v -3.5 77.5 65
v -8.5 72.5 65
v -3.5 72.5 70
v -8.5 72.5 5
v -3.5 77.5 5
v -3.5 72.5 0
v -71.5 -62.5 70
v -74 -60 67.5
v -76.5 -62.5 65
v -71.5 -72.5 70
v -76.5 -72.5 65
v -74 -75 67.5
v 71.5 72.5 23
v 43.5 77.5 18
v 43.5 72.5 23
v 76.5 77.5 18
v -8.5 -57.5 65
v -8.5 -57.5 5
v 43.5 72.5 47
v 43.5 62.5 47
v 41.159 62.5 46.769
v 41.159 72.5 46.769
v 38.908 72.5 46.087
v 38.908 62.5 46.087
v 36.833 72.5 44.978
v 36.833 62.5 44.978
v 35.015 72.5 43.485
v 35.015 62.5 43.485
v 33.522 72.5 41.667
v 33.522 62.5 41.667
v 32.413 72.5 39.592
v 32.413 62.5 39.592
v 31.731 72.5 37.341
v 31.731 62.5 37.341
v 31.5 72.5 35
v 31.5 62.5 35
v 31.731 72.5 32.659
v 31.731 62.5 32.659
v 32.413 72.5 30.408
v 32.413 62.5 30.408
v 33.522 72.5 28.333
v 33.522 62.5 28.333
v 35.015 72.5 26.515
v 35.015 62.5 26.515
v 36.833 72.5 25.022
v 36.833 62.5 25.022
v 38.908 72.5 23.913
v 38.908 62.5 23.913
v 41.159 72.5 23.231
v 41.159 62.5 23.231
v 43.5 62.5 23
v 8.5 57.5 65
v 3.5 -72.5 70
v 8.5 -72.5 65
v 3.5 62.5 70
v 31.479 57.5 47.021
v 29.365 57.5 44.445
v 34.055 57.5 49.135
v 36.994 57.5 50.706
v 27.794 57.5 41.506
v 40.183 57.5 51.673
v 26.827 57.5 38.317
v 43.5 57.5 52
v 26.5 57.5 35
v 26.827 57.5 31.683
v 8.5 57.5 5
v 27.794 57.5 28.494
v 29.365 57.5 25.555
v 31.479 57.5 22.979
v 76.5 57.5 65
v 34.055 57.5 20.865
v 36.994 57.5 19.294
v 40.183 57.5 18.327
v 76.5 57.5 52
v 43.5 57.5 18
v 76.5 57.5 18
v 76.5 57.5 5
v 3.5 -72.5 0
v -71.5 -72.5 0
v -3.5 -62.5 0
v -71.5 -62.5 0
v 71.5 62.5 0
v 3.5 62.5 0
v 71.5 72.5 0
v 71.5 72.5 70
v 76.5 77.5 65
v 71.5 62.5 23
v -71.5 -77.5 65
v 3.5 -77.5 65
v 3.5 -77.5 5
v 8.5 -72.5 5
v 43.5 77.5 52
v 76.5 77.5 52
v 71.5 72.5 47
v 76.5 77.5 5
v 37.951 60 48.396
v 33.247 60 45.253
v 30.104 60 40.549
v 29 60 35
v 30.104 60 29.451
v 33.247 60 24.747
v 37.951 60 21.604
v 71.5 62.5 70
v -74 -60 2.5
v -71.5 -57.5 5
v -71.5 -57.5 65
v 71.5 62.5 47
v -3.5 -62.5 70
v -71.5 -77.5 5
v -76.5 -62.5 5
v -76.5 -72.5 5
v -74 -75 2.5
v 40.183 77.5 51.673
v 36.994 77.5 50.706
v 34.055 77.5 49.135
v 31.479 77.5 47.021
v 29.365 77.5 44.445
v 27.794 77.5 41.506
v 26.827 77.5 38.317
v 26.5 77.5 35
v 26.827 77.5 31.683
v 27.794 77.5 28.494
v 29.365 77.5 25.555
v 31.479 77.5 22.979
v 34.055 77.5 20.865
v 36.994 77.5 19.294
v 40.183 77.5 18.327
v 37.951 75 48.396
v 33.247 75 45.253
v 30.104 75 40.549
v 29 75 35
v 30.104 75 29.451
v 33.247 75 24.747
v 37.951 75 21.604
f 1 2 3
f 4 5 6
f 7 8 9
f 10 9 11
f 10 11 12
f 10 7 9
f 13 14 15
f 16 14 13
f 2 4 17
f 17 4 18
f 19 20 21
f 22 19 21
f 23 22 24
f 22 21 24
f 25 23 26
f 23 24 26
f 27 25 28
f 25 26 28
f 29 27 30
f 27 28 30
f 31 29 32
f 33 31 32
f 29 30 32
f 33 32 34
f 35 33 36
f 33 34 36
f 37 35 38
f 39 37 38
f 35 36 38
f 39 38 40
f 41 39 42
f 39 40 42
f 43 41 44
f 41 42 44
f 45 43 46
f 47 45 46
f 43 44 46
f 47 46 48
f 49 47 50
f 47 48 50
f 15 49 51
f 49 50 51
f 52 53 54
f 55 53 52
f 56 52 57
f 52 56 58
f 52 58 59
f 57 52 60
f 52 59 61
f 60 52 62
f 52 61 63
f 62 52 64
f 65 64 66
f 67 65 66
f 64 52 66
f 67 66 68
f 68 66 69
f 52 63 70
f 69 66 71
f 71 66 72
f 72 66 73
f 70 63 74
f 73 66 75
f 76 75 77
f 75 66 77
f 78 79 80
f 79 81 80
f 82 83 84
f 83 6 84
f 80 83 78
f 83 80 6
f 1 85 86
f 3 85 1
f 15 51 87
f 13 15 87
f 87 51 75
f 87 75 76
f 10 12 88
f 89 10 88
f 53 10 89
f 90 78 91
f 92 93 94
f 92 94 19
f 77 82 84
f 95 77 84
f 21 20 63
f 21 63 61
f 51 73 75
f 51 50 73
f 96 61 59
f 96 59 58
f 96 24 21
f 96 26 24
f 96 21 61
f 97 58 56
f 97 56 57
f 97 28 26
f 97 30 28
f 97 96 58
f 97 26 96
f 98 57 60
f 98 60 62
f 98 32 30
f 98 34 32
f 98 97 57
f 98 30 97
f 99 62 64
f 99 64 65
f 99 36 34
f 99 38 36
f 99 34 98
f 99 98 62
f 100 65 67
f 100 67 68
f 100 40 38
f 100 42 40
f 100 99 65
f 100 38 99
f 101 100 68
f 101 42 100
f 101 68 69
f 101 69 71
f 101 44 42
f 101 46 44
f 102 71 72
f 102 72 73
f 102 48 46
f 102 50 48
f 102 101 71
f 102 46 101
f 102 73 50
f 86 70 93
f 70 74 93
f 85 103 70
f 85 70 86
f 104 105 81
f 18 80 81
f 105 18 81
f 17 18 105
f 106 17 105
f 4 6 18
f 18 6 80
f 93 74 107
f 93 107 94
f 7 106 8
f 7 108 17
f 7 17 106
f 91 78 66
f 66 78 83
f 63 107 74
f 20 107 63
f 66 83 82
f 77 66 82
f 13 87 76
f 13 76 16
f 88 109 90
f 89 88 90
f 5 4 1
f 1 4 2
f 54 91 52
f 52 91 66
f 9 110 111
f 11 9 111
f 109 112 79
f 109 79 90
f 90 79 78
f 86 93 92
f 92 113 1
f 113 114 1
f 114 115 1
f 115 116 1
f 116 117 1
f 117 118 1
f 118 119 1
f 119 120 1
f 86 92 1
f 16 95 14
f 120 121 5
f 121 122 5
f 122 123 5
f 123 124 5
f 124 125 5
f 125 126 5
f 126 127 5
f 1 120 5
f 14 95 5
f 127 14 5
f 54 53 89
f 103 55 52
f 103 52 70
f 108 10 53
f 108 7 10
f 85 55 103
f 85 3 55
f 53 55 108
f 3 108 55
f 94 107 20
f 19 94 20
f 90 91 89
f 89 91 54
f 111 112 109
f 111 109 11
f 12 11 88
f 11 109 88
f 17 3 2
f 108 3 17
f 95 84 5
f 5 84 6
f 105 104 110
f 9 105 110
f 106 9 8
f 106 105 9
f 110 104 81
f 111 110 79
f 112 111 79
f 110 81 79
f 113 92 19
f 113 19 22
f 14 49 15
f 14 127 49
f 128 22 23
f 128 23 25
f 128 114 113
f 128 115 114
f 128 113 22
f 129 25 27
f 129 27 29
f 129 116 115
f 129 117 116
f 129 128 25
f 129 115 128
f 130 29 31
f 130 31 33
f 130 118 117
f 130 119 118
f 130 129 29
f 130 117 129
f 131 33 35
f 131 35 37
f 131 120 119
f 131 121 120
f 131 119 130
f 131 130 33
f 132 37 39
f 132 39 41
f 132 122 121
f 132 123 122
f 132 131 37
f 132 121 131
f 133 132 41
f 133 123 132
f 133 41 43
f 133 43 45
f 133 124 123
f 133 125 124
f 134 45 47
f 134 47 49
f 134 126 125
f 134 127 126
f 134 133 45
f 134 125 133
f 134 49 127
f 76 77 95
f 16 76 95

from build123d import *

# Parameters (mm, degrees)
F0_W     = 17
F0_H     = 115
F1_DEPTH = 70
F2_SIZE  = 5
F4_DEPTH = 20.001
F5_SIZE  = 5
F6_SIZE  = 5


with BuildPart() as f1:
    # F0 (on Top) → F1 (new body)
    with BuildSketch(Plane.XY):
        Rectangle(F0_W, F0_H)
        Polygon((-8.5, 57.5), (8.5, 57.5), (76.5, 57.5), (76.5, 77.5), (-8.5, 77.5), align=None)
        Polygon((8.5, -77.5), (8.5, -57.5), (-8.5, -57.5), (-76.5, -57.5), (-76.5, -77.5), align=None)
    extrude(amount=F1_DEPTH)

    # F2
    f2_edges = [f1.edges().sort_by_distance(p)[0] for p in [
        (-8.5, 77.5, 35),
        (-8.5, 10, 70),
        (34, 77.5, 70),
        (-42.5, -57.5, 70),
        (8.5, -10, 70),
        (-34, -77.5, 70),
        (42.5, 57.5, 70),
        (34, 77.5, 0),
        (42.5, 57.5, 0),
        (8.5, -10, 0),
        (-34, -77.5, 0),
        (8.5, -77.5, 35),
        (-42.5, -57.5, 0),
        (-8.5, 10, 0),
    ]]
    chamfer(f2_edges, length=F2_SIZE)

    # F3 (on face) → F4 (cut, through all)
    with BuildSketch(Plane.XZ.offset(-57.5)):
        with BuildLine():
            Line((43.5, 23), (43.5, 47))
            ThreePointArc((43.5, 47), (31.5, 35), (43.5, 23))
        make_face()
        with BuildLine():
            ThreePointArc((43.5, 23), (51.9852813742, 26.5147186258), (55.5, 35))
            ThreePointArc((55.5, 35), (51.9852813742, 43.4852813742), (43.5, 47))
            Line((43.5, 47), (43.5, 23))
        make_face()
        with BuildLine():
            ThreePointArc((43.5, 47), (51.9852813742, 43.4852813742), (55.5, 35))
            ThreePointArc((55.5, 35), (51.9852813742, 26.5147186258), (43.5, 23))
            Line((43.5, 23), (76.5, 23))
            Line((76.5, 23), (76.5, 47))
            Line((76.5, 47), (43.5, 47))
        make_face()
    extrude(amount=-F4_DEPTH, mode=Mode.SUBTRACT)

    # F5
    f5_edges = [f1.edges().sort_by_distance(p)[0] for p in [
        (31.5, 57.5, 35),
        (31.5, 77.5, 35),
        (76.5, 67.5, 47),
        (76.5, 67.5, 23),
    ]]
    chamfer(f5_edges, length=F5_SIZE)

    # F6 (call 1 of 6: OpenCascade refuses the feature's edges together)
    f6_edges = [f1.edges().sort_by_distance(p)[0] for p in [
        (76.5, 67.5, 70),
    ]]
    chamfer(f6_edges, length=F6_SIZE)

    # F6#2 (call 2 of 6)
    f6_2_edges = [f1.edges().sort_by_distance(p)[0] for p in [
        (76.5, 67.5, 0),
    ]]
    chamfer(f6_2_edges, length=F6_SIZE)

    # F6#3 (call 3 of 6)
    f6_3_edges = [f1.edges().sort_by_distance(p)[0] for p in [
        (-76.5, -57.5, 35),
    ]]
    chamfer(f6_3_edges, length=F6_SIZE)

    # F6#4 (call 4 of 6)
    f6_4_edges = [f1.edges().sort_by_distance(p)[0] for p in [
        (-76.5, -77.5, 35),
    ]]
    chamfer(f6_4_edges, length=F6_SIZE)

    # F6#5 (call 5 of 6)
    f6_5_edges = [f1.edges().sort_by_distance(p)[0] for p in [
        (-76.5, -67.5, 0),
    ]]
    chamfer(f6_5_edges, length=F6_SIZE)

    # F6#6 (call 6 of 6)
    f6_6_edges = [f1.edges().sort_by_distance(p)[0] for p in [
        (-76.5, -67.5, 70),
    ]]
    chamfer(f6_6_edges, length=F6_SIZE)


solid = f1.part
